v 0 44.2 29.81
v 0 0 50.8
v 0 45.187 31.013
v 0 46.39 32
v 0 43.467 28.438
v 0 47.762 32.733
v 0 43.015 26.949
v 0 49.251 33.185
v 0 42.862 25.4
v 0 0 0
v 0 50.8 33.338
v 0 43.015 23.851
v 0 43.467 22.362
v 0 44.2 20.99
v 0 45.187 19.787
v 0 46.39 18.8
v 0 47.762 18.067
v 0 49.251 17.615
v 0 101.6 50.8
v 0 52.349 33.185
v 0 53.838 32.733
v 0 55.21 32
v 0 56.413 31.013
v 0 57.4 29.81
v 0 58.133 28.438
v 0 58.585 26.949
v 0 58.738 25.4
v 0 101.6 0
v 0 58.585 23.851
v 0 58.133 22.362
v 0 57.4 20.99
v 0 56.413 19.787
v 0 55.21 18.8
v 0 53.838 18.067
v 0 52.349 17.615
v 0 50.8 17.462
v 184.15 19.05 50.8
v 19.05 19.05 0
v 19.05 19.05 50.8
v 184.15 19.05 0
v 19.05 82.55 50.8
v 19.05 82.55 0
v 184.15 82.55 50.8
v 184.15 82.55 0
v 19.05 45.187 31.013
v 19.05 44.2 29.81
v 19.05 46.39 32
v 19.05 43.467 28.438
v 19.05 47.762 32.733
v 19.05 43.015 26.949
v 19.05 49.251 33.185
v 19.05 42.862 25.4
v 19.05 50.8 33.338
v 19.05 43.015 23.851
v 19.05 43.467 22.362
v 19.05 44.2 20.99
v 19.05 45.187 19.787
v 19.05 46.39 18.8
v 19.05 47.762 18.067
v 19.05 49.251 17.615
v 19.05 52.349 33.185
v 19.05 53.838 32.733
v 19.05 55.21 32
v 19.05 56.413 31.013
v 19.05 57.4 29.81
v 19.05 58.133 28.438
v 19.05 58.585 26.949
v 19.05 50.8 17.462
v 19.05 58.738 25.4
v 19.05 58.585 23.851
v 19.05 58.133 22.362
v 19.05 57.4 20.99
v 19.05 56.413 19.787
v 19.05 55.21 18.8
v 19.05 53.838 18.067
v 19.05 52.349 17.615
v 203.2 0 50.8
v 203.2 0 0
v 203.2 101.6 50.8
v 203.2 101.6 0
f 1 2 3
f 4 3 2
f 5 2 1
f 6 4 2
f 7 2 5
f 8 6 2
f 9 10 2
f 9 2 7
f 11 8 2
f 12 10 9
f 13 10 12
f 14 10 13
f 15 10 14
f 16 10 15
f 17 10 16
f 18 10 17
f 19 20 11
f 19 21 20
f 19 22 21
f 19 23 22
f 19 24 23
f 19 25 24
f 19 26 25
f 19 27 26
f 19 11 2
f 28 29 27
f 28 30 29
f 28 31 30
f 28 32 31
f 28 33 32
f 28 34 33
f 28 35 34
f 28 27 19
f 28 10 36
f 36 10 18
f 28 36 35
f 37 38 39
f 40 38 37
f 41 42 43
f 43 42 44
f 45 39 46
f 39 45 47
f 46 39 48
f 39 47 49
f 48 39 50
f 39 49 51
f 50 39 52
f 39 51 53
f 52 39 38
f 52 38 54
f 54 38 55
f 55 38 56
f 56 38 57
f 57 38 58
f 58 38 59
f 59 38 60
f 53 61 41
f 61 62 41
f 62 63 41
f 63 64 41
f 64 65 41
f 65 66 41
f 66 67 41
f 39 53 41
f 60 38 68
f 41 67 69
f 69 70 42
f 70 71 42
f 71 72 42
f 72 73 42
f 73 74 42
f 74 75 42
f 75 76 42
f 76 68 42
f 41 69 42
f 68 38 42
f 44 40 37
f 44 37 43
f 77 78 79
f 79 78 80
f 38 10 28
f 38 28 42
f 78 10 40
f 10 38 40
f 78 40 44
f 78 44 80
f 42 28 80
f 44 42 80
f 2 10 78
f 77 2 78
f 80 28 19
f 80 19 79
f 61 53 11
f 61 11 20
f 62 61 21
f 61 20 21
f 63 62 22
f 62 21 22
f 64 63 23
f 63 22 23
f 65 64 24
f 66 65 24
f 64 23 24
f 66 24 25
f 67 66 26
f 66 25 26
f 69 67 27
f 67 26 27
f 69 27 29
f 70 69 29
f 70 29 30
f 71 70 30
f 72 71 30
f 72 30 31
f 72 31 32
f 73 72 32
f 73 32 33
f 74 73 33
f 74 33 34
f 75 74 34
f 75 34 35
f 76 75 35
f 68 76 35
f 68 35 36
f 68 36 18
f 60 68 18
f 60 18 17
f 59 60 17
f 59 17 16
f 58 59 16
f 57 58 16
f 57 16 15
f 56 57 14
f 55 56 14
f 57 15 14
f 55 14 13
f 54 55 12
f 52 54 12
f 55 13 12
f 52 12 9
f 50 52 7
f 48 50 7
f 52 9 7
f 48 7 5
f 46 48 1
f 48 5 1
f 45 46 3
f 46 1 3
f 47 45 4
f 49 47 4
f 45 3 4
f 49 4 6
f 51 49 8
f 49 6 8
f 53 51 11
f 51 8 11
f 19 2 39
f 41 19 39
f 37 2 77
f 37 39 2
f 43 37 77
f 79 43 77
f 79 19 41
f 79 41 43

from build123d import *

# Parameters (mm, degrees)
SKETCH1_W           = 203.2
SKETCH1_H           = 101.6
SKETCH1_W_2         = 165.1
SKETCH1_H_2         = 63.5
BOSS_EXTRUDE1_DEPTH = 50.8
SKETCH2_R           = 7.9375
CUT_EXTRUDE1_DEPTH  = 50.8


with BuildPart() as part:
    # Sketch1 → Boss-Extrude1 (new body)
    with BuildSketch(Plane.XY):
        with Locations((101.6, 50.8)):
            Rectangle(SKETCH1_W, SKETCH1_H)
        with Locations((101.6, 50.8)):
            Rectangle(SKETCH1_W_2, SKETCH1_H_2, mode=Mode.SUBTRACT)
    extrude(amount=BOSS_EXTRUDE1_DEPTH)

    # Sketch2 → Cut-Extrude1 (cut)
    with BuildSketch(Plane.ZY):
        with Locations((25.4, 50.8)):
            Circle(SKETCH2_R)
    extrude(amount=-CUT_EXTRUDE1_DEPTH, mode=Mode.SUBTRACT)


solid = part.part
